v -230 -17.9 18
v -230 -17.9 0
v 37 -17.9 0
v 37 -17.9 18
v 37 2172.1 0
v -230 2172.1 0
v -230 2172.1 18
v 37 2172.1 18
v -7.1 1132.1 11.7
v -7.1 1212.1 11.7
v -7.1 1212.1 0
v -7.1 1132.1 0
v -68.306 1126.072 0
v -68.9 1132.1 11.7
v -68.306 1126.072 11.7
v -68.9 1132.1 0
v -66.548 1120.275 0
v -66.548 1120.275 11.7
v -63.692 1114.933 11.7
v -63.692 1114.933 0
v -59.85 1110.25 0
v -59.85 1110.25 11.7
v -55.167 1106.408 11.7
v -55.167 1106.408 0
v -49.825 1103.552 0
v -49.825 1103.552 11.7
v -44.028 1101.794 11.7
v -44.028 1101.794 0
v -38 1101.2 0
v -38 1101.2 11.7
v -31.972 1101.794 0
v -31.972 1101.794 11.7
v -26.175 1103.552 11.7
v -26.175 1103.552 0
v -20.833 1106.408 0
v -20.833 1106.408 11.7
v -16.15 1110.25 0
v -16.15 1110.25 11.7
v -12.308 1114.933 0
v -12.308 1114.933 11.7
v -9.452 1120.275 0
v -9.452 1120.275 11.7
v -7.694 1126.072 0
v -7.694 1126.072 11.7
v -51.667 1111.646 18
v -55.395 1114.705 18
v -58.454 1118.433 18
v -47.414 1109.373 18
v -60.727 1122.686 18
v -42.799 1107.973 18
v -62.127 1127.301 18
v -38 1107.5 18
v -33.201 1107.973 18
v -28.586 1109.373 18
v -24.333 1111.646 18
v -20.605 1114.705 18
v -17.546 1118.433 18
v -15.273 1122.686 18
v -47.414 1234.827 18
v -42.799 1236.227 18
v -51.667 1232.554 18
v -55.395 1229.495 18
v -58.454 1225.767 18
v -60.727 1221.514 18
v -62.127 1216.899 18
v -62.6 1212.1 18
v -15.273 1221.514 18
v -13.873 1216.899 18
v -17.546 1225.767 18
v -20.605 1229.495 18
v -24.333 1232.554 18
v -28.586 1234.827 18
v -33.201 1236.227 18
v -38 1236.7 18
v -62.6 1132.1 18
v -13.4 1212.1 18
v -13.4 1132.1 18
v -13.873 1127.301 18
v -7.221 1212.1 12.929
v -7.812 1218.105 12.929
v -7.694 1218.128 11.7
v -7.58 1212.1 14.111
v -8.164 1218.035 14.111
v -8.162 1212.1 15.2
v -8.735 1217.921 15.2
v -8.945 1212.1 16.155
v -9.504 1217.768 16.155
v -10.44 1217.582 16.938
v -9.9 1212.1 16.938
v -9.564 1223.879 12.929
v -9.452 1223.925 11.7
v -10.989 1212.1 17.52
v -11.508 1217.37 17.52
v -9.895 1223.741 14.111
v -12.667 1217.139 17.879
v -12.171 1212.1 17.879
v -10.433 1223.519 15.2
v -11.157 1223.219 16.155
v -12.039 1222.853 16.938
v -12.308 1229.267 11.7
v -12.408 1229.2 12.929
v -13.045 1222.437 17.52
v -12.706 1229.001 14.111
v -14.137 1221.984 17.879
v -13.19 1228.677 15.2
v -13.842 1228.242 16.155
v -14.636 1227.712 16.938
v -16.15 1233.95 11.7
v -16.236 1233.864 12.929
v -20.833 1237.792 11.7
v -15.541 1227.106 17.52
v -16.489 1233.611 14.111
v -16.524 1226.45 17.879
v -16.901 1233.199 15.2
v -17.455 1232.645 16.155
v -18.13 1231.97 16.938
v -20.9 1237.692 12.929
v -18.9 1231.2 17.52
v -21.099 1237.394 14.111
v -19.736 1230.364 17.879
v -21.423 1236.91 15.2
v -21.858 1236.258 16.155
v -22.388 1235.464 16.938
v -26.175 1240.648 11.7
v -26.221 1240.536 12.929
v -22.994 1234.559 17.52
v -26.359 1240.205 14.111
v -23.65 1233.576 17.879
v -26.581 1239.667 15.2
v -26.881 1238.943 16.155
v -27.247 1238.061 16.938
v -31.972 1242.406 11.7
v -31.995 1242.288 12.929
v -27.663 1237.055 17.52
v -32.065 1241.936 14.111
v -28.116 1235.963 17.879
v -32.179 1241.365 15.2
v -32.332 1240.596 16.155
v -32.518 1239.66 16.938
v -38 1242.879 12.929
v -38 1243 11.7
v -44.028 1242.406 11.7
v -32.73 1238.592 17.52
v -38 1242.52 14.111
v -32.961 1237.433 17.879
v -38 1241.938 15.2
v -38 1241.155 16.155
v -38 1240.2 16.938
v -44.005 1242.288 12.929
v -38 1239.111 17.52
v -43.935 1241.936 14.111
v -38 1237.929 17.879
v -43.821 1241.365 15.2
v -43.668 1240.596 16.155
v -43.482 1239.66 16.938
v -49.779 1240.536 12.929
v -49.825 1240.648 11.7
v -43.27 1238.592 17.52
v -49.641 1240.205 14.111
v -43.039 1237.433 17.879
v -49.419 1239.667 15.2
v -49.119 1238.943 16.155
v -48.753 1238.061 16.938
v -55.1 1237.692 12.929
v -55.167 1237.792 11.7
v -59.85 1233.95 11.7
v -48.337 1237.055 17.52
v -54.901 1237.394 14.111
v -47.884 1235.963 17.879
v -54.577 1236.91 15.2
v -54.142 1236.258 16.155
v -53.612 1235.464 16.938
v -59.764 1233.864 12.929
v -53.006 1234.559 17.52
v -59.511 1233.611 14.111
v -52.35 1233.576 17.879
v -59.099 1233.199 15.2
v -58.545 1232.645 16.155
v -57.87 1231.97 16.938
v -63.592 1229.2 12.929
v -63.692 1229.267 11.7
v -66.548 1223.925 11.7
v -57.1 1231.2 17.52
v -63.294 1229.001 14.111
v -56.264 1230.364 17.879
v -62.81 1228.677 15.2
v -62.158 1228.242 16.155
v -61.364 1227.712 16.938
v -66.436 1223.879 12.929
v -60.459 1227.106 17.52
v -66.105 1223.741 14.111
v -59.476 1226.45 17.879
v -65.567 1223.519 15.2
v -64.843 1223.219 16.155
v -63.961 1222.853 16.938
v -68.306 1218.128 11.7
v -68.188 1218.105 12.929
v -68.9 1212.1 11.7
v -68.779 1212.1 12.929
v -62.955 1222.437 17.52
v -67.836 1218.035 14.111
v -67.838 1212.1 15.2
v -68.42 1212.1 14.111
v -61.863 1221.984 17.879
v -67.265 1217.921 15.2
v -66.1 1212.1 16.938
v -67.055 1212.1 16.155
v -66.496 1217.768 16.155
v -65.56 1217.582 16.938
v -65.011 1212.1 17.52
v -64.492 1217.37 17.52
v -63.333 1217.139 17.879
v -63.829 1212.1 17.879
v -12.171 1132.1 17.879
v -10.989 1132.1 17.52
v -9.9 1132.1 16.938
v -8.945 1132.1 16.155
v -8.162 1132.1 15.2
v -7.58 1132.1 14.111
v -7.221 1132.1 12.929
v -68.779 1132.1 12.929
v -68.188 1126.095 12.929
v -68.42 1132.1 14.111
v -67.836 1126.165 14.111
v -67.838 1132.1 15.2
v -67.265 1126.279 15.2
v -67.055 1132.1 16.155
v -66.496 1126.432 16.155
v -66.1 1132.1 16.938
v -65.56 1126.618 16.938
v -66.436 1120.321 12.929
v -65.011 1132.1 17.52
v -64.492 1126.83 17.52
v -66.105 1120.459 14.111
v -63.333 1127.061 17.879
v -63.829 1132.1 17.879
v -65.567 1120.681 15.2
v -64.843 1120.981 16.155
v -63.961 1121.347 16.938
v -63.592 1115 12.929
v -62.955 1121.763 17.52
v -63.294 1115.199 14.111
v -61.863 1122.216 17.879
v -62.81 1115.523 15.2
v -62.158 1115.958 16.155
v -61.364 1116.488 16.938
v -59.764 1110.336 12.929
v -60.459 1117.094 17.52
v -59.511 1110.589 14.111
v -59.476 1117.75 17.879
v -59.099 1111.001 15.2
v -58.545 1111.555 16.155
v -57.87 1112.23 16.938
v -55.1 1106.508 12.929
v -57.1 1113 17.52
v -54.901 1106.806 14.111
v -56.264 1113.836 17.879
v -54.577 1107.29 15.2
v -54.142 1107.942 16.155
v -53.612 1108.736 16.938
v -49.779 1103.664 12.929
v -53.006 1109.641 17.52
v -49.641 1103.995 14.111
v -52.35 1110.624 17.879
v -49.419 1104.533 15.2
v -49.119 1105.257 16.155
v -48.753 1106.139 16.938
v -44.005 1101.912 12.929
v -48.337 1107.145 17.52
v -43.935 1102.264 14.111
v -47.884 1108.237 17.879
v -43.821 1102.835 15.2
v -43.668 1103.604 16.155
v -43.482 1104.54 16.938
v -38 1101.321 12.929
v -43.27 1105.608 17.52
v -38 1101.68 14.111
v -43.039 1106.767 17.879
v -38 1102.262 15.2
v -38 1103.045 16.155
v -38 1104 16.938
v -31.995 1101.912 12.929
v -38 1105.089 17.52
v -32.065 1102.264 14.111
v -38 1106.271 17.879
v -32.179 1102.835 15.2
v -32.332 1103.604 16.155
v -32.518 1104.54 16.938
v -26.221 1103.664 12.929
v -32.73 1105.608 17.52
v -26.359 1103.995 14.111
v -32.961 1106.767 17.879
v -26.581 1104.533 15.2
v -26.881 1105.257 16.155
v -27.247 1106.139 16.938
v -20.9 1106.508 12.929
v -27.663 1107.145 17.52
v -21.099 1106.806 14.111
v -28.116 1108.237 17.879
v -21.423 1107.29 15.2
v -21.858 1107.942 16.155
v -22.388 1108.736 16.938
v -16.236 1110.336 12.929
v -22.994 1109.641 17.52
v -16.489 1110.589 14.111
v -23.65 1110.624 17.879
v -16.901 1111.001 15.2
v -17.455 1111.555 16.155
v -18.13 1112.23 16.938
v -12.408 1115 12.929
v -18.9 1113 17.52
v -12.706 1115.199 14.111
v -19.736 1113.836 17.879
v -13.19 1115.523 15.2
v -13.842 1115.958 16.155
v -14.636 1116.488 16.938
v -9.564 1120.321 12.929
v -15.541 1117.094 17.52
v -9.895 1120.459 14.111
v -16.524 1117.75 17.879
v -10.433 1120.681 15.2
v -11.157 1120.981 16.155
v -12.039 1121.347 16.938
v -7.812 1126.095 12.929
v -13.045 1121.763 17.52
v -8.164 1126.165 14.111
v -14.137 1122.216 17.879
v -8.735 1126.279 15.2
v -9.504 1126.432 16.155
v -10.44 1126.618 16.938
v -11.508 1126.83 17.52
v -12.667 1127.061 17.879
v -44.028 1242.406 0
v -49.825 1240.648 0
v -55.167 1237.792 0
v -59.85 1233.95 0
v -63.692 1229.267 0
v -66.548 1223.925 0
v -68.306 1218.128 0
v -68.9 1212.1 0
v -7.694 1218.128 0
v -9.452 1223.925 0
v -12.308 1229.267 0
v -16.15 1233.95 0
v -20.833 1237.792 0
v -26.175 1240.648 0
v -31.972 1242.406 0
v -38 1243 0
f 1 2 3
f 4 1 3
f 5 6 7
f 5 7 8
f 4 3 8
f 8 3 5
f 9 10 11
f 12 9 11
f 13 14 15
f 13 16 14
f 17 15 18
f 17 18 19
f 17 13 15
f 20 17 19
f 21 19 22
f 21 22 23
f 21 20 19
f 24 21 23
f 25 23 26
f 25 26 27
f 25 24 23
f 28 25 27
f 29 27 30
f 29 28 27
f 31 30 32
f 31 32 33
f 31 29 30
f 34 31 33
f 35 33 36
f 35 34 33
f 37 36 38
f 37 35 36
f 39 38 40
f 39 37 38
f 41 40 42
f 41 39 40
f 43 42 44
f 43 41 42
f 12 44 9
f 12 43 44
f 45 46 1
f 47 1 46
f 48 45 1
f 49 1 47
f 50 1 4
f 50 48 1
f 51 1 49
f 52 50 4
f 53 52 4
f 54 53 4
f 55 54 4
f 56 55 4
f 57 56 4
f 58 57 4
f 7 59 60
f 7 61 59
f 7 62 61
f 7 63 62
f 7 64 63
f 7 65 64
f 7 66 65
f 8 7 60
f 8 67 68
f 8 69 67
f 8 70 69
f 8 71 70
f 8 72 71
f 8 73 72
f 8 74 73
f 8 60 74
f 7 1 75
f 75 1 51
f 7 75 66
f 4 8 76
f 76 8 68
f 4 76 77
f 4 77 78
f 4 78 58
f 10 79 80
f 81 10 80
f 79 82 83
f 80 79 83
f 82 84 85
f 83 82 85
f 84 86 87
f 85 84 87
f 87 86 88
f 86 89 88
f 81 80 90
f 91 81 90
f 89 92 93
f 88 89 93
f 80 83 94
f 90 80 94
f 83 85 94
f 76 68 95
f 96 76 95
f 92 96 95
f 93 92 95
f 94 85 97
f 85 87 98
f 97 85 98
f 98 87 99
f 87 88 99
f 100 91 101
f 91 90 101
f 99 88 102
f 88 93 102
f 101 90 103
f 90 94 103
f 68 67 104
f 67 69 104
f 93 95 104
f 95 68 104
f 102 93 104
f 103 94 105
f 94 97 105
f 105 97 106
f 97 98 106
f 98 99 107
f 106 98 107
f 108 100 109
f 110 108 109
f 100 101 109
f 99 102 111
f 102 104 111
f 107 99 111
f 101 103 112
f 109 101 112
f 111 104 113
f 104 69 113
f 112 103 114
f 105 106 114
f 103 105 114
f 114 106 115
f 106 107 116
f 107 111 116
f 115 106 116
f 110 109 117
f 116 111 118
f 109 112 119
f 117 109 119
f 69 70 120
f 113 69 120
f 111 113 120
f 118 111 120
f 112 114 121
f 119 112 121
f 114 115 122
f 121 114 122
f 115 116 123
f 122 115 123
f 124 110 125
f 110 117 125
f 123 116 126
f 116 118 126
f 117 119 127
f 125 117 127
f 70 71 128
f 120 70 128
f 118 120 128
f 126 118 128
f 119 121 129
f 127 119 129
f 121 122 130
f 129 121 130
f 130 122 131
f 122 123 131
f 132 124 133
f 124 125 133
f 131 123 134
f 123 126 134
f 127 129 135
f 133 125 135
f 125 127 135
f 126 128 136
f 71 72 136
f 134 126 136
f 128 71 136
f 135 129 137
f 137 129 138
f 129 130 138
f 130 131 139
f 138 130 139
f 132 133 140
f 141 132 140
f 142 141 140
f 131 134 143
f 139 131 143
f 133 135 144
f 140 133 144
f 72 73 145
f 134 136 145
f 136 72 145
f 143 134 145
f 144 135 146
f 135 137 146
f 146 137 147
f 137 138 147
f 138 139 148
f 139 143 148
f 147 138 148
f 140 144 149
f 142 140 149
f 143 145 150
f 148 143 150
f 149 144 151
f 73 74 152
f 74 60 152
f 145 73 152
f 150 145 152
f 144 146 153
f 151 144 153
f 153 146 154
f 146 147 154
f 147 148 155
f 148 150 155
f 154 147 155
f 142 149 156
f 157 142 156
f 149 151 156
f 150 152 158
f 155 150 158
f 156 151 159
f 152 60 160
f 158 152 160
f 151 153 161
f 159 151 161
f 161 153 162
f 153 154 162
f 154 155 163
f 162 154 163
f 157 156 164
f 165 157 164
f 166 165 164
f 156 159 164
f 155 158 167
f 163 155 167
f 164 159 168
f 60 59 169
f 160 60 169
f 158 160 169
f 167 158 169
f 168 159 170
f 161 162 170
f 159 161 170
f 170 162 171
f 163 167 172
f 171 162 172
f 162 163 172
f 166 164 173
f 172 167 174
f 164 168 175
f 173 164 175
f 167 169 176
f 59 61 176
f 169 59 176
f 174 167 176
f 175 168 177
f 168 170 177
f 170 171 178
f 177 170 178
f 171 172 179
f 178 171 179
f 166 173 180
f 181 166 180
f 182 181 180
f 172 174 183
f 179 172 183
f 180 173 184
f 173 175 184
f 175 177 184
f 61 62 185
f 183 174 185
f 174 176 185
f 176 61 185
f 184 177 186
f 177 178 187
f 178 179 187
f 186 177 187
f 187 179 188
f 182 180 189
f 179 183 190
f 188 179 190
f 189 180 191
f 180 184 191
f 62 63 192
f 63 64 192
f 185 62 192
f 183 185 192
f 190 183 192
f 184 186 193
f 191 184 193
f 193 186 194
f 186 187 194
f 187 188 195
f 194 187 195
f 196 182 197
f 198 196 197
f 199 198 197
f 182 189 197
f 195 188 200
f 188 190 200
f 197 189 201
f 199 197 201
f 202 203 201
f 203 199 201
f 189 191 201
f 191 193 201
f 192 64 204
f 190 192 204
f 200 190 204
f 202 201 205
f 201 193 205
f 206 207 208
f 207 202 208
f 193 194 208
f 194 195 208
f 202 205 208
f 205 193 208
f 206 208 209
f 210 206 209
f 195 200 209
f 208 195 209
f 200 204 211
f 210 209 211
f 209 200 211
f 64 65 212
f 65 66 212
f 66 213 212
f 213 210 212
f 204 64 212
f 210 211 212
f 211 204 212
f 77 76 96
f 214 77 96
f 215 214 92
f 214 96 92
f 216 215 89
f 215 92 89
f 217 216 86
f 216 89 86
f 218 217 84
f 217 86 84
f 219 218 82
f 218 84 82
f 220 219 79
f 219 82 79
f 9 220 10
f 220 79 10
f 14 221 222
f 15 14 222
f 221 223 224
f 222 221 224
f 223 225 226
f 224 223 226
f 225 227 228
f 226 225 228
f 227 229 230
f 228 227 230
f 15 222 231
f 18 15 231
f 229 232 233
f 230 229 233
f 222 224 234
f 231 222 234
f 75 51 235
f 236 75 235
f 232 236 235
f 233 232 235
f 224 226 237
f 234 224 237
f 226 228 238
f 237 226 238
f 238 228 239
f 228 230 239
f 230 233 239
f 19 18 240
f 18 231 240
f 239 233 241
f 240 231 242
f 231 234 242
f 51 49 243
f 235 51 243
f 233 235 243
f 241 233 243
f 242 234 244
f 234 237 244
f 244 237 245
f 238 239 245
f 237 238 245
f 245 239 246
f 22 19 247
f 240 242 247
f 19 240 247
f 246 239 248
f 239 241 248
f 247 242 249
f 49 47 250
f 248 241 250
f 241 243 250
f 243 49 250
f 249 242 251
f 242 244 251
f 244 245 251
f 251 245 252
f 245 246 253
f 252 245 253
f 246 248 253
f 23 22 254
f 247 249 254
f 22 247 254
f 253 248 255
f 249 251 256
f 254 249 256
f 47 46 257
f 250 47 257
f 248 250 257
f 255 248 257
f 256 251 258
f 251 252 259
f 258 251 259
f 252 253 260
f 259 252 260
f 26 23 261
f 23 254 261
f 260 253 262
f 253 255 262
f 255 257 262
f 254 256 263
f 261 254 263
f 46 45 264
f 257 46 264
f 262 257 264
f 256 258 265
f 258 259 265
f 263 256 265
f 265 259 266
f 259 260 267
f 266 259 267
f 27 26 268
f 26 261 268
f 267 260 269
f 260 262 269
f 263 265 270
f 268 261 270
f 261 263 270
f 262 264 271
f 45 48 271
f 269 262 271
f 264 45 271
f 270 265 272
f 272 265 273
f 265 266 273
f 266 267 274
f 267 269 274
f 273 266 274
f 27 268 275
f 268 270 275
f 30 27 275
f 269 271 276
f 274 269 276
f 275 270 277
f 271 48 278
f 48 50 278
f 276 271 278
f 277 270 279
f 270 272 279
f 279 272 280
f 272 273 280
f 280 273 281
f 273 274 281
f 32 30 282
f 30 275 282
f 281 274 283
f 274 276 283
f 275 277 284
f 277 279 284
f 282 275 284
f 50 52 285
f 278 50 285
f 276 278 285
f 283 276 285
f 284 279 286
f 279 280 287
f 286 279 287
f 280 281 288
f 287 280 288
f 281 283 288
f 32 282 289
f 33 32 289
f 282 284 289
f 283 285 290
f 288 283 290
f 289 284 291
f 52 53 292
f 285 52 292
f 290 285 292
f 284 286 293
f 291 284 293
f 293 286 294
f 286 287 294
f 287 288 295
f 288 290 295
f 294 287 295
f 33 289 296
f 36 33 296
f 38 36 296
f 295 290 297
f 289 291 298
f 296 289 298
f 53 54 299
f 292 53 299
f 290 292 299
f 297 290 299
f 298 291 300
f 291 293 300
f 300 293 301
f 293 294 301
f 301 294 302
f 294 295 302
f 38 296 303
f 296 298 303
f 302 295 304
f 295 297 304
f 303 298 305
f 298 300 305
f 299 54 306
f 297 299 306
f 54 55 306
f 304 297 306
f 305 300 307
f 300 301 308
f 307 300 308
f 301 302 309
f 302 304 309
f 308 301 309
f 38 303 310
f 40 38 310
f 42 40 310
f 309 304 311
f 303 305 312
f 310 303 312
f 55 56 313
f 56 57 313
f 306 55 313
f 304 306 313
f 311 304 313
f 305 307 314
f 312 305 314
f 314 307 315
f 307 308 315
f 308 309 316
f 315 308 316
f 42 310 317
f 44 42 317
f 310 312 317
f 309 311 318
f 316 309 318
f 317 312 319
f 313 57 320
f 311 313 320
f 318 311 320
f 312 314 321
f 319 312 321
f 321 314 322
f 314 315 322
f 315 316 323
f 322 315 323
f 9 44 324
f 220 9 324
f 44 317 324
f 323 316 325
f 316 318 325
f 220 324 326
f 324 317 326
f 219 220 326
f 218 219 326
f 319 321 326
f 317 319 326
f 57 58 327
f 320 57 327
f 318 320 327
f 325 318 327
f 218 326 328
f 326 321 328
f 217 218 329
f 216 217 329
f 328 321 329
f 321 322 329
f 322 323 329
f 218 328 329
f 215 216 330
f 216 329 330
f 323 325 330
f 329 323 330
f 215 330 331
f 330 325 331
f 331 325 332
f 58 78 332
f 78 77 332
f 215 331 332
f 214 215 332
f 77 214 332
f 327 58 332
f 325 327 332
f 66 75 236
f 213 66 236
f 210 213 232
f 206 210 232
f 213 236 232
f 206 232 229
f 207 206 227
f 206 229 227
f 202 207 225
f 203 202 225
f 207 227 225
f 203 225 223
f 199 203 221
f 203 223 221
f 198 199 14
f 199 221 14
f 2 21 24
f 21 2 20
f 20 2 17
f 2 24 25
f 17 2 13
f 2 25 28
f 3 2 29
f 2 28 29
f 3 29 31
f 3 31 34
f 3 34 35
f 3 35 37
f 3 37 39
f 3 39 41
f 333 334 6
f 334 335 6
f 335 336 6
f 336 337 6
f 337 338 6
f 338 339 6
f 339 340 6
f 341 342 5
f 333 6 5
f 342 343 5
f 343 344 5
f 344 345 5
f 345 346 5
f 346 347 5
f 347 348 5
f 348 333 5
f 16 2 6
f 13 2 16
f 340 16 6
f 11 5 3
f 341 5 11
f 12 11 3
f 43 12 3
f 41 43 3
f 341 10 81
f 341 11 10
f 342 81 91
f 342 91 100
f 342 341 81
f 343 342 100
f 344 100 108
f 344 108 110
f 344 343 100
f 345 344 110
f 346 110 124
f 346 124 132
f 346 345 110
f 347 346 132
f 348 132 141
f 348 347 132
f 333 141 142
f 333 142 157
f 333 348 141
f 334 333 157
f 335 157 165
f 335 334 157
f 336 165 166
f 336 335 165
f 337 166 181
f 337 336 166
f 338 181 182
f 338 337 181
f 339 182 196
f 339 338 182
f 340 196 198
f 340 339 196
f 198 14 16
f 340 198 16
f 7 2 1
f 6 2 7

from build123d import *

# Parameters (mm, degrees)
SKETCH1_W           = 267
SKETCH1_H           = 2190
BOSS_EXTRUDE1_DEPTH = 18
CUT_EXTRUDE2_DEPTH  = 2185.317378496


with BuildPart() as part:
    # Sketch1 → Boss-Extrude1 (new body)
    with BuildSketch(Plane.XY):
        with Locations((-96.5, 1077.1)):
            Rectangle(SKETCH1_W, SKETCH1_H)
    extrude(amount=BOSS_EXTRUDE1_DEPTH)

    # Sketch2 → Cut-Extrude2 (cut, through all)
    with BuildSketch(Plane(origin=(0, 0, 0), x_dir=(-1, 0, 0), z_dir=(0, 0, -1))):
        with BuildLine():
            Line((58, 1212.1), (58, 1132.1))
            ThreePointArc((58, 1132.1), (38, 1112.1), (18, 1132.1))
            Line((18, 1132.1), (18, 1212.1))
            ThreePointArc((18, 1212.1), (38, 1232.1), (58, 1212.1))
        make_face()
    extrude(amount=-CUT_EXTRUDE2_DEPTH, mode=Mode.SUBTRACT)

    # Cut-Sweep4: sweep along a path in Sketch6
    with BuildLine(Plane.XY.offset(18)) as cut_sweep4_path:
        Line((-58, 1212.1), (-58, 1132.1))
        ThreePointArc((-58, 1132.1), (-38, 1112.1), (-18, 1132.1))
        Line((-18, 1132.1), (-18, 1212.1))
        ThreePointArc((-18, 1212.1), (-38, 1232.1), (-58, 1212.1))
    # Sketch5 → Cut-Sweep4 (sweep, cut)
    with BuildSketch(Plane(origin=(0, 1212.1, 0), x_dir=(0, 0, -1), z_dir=(0, -1, 0))):
        with BuildLine():
            Line((0, -62.6), (0, -68.9))
            Line((0, -68.9), (-11.7, -68.9))
            ThreePointArc((-11.7, -68.9), (-16.154772721, -67.054772721), (-18, -62.6))
            Line((-18, -62.6), (-18, -58))
            Line((-18, -58), (0, -58))
            Line((0, -58), (0, -62.6))
        make_face()
    sweep(path=cut_sweep4_path.line, mode=Mode.SUBTRACT)


solid = part.part
